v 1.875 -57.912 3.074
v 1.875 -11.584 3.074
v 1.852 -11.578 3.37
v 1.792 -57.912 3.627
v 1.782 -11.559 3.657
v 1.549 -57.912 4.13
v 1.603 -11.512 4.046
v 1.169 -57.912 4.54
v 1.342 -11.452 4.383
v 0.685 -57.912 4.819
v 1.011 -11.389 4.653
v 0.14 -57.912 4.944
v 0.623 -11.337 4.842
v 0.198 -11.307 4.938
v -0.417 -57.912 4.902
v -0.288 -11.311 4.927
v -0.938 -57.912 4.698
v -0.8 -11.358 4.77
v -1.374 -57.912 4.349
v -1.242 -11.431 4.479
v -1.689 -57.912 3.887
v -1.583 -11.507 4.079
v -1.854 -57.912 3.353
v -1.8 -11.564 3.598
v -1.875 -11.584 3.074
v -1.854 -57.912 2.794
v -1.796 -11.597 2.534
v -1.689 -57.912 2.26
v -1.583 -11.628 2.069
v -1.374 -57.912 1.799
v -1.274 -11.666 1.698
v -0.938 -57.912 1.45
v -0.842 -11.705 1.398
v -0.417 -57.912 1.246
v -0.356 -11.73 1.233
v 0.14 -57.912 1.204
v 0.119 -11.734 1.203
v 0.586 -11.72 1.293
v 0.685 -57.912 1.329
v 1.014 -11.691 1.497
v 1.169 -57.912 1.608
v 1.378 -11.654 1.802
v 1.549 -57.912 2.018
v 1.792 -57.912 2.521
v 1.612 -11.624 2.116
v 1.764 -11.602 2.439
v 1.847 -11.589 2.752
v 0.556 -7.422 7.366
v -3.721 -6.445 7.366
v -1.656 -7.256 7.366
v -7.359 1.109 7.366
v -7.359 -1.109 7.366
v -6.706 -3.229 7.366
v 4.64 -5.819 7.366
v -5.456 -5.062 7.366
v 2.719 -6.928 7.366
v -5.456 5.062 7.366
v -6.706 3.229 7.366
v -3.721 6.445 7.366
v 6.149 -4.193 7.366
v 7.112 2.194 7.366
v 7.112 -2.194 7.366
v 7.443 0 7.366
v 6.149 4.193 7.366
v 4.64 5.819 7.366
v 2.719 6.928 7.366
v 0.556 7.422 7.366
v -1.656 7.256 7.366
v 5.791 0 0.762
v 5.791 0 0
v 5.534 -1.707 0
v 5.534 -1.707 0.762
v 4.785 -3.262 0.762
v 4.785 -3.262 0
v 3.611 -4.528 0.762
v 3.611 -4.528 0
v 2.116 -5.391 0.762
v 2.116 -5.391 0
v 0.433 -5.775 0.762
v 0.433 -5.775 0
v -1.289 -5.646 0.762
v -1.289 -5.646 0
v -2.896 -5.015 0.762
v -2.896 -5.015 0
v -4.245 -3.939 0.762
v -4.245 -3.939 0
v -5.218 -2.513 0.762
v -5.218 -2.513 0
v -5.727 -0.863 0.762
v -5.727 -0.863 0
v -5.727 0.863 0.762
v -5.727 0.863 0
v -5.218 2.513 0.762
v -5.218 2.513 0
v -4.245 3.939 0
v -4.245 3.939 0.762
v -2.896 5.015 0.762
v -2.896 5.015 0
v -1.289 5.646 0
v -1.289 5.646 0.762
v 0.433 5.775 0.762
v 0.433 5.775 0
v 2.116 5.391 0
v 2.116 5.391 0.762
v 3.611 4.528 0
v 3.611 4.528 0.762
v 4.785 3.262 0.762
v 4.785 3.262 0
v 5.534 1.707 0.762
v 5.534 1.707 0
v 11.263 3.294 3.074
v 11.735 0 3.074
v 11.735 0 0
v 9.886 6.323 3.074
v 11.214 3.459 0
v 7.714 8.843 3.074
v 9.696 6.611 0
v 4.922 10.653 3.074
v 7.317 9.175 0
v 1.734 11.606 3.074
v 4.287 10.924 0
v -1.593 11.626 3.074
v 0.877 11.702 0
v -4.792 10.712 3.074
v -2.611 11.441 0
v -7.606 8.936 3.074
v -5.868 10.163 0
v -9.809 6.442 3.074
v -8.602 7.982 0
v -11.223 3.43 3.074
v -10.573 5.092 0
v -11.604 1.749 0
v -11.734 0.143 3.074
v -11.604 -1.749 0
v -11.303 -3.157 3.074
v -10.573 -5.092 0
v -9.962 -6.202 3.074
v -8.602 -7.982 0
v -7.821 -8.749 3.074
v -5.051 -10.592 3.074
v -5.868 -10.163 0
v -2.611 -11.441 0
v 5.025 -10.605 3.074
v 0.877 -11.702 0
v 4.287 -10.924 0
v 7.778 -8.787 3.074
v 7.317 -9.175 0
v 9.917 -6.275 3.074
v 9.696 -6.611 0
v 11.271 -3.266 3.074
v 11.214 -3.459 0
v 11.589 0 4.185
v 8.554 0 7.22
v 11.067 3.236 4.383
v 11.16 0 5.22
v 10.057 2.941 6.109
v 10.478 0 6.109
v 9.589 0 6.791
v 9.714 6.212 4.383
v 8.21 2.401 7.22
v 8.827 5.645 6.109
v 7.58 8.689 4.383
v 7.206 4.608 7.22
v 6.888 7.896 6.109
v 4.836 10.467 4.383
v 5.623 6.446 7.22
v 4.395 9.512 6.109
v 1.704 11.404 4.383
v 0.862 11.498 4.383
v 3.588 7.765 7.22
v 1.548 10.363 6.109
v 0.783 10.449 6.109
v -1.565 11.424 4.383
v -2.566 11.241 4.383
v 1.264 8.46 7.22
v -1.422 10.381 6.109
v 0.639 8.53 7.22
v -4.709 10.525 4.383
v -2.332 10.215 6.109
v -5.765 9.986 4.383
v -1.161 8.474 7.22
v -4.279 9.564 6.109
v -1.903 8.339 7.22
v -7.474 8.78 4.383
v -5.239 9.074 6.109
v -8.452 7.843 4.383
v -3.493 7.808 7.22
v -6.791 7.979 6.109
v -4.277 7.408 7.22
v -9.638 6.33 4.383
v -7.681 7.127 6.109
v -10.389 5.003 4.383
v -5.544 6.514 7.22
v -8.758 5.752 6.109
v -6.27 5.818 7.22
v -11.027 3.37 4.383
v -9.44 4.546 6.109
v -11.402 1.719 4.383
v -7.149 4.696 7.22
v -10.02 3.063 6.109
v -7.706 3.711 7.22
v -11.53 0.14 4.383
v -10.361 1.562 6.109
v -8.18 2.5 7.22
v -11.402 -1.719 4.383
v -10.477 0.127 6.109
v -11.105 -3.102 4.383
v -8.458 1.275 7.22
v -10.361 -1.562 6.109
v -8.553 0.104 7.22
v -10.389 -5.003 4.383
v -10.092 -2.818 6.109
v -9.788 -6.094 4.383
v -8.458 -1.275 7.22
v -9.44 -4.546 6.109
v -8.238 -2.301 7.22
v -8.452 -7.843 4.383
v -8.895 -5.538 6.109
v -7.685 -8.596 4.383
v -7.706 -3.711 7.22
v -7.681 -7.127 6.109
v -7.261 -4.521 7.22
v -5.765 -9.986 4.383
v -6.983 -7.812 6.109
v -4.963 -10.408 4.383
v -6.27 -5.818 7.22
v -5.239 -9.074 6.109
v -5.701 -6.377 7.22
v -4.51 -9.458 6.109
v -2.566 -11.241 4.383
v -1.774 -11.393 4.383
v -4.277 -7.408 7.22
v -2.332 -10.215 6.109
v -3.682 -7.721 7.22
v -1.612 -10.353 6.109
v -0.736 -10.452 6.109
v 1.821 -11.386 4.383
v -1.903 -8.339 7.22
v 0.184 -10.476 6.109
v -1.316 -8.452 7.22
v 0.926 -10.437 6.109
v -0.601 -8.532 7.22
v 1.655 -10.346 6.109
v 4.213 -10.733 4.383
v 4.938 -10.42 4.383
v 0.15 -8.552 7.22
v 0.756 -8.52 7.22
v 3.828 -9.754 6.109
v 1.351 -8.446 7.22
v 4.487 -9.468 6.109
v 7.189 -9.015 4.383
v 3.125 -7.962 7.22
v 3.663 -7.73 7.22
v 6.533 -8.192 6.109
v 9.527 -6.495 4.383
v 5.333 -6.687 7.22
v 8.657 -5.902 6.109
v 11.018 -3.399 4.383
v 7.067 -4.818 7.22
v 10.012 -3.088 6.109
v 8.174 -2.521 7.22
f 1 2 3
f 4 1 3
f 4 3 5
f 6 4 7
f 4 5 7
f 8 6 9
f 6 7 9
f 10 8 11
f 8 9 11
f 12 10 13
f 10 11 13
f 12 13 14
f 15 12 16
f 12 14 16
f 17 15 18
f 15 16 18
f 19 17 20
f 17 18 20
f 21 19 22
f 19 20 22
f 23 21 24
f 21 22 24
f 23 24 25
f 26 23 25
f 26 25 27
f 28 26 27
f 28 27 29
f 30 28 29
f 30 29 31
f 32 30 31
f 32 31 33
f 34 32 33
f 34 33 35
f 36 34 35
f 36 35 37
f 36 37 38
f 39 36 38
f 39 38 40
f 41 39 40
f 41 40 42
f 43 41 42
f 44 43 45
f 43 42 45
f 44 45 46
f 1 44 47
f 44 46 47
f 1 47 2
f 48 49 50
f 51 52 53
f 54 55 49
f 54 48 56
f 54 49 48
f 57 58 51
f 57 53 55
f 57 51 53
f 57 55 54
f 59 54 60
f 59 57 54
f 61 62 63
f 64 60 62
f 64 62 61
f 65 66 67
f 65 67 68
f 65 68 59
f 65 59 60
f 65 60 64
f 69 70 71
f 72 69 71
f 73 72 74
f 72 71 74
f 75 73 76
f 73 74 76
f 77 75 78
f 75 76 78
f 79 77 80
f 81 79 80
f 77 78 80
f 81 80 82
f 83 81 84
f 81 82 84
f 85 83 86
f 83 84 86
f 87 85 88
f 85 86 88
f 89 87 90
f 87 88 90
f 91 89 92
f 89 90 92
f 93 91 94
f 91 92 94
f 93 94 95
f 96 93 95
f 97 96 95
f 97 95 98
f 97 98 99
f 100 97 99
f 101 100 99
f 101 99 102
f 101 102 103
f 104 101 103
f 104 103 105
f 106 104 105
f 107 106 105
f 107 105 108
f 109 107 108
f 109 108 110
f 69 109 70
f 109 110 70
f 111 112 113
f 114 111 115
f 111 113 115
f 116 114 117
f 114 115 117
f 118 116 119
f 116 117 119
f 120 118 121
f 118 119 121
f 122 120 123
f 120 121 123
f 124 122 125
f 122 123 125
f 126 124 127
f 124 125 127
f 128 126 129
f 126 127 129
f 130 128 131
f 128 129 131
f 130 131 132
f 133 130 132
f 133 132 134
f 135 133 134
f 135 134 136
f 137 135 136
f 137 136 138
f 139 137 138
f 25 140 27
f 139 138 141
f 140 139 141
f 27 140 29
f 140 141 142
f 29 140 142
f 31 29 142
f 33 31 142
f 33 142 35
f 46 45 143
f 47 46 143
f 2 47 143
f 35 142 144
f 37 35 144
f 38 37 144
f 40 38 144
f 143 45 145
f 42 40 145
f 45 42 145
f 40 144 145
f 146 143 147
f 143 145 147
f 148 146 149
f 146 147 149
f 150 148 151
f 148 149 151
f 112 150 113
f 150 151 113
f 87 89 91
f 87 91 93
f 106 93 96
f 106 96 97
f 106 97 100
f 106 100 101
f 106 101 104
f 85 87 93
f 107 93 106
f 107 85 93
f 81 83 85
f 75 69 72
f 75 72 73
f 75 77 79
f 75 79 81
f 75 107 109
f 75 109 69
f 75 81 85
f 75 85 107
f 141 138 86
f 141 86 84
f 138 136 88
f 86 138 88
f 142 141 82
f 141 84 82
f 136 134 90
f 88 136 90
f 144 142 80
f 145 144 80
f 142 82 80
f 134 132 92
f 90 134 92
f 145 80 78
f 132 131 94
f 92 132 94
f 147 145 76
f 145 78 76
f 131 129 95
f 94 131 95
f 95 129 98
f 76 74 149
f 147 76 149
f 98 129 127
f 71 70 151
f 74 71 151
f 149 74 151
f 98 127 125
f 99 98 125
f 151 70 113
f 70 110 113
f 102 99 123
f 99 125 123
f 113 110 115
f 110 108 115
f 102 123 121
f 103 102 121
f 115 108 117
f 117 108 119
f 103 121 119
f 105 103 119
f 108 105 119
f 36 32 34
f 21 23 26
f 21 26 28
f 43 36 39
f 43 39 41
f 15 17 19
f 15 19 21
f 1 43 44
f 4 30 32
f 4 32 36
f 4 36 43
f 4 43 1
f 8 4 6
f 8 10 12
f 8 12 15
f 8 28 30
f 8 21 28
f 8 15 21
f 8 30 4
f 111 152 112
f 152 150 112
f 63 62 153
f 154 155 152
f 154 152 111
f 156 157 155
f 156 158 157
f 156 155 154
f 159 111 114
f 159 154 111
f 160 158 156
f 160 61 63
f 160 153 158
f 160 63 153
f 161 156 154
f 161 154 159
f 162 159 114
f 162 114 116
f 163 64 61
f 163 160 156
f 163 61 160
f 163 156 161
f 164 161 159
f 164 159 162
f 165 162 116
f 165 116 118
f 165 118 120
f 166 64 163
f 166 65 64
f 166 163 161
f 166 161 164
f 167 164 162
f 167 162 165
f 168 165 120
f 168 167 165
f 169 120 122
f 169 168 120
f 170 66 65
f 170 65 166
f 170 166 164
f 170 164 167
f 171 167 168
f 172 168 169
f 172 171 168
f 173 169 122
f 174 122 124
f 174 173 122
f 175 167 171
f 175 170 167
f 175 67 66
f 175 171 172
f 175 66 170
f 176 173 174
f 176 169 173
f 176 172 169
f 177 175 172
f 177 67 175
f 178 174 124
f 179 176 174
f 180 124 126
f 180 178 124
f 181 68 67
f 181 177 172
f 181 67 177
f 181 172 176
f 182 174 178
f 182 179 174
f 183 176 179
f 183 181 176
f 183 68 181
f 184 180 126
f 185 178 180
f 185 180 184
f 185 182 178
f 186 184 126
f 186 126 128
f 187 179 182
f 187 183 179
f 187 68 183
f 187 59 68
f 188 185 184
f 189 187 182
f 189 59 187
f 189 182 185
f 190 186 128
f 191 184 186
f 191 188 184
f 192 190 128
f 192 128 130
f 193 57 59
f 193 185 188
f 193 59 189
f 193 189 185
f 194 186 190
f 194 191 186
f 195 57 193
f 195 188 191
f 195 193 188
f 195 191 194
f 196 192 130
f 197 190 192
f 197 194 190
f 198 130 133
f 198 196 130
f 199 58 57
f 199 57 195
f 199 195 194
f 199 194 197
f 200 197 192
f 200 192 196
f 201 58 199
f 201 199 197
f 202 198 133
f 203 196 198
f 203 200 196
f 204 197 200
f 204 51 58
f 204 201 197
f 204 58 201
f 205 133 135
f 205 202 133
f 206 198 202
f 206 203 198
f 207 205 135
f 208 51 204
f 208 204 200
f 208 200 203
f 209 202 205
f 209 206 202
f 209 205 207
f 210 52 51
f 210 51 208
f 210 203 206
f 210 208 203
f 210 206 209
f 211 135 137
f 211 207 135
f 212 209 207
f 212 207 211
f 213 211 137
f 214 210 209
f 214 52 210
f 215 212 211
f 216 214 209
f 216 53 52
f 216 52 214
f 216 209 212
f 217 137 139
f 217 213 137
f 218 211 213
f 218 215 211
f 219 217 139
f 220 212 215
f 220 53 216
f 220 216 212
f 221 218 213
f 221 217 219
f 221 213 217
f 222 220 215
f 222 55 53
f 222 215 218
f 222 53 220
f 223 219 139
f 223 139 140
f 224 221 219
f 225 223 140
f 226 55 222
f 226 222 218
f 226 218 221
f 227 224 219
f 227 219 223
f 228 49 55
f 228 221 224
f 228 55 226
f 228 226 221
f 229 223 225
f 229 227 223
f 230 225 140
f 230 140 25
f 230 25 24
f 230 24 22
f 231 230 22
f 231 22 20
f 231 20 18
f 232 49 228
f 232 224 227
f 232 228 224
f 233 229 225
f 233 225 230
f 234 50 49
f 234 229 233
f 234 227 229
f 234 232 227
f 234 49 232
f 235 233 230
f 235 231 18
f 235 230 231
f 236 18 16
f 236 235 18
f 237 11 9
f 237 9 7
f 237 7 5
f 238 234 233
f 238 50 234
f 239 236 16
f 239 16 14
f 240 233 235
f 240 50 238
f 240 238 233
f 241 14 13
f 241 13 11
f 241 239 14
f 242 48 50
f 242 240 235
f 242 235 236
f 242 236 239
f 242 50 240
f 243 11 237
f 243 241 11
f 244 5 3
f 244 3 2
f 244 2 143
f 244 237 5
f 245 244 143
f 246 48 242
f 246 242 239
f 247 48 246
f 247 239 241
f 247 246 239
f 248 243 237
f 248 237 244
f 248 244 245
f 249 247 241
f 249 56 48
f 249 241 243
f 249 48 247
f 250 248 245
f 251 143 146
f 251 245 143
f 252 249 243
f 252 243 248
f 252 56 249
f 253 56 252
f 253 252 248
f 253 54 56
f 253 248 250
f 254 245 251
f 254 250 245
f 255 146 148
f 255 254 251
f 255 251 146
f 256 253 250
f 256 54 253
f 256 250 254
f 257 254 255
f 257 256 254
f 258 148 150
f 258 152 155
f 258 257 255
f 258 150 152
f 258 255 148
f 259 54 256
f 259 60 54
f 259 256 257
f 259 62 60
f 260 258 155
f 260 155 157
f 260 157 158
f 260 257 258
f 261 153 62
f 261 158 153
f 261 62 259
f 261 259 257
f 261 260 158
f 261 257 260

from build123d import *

# Parameters (mm, degrees)
F0_R     = 11.735047
F1_DEPTH = 7.366
F2_R     = 4.292472
F3_R     = 5.7912
F4_DEPTH = 0.762
F5_R     = 1.875011
F6_DEPTH = 57.912


with BuildPart() as f1:
    # F0 (on Top) → F1 (new body)
    with BuildSketch(Plane.XY):
        Circle(F0_R)
    extrude(amount=F1_DEPTH)

    # F2
    f2_edges = [f1.edges().sort_by_distance(p)[0] for p in [
        (-11.735047, 0, 7.366),
    ]]
    fillet(f2_edges, radius=F2_R)

    # F3 (on face) → F4 (cut)
    with BuildSketch(Plane(origin=(0, 0, 0), x_dir=(1, 0, 0), z_dir=(0, 0, -1))):
        Circle(F3_R)
    extrude(amount=-F4_DEPTH, mode=Mode.SUBTRACT)

    # F5 (on Front) → F6 (join)
    with BuildSketch(Plane.XZ):
        with Locations((0, 3.073911)):
            Circle(F5_R)
    extrude(amount=F6_DEPTH)


solid = f1.part
